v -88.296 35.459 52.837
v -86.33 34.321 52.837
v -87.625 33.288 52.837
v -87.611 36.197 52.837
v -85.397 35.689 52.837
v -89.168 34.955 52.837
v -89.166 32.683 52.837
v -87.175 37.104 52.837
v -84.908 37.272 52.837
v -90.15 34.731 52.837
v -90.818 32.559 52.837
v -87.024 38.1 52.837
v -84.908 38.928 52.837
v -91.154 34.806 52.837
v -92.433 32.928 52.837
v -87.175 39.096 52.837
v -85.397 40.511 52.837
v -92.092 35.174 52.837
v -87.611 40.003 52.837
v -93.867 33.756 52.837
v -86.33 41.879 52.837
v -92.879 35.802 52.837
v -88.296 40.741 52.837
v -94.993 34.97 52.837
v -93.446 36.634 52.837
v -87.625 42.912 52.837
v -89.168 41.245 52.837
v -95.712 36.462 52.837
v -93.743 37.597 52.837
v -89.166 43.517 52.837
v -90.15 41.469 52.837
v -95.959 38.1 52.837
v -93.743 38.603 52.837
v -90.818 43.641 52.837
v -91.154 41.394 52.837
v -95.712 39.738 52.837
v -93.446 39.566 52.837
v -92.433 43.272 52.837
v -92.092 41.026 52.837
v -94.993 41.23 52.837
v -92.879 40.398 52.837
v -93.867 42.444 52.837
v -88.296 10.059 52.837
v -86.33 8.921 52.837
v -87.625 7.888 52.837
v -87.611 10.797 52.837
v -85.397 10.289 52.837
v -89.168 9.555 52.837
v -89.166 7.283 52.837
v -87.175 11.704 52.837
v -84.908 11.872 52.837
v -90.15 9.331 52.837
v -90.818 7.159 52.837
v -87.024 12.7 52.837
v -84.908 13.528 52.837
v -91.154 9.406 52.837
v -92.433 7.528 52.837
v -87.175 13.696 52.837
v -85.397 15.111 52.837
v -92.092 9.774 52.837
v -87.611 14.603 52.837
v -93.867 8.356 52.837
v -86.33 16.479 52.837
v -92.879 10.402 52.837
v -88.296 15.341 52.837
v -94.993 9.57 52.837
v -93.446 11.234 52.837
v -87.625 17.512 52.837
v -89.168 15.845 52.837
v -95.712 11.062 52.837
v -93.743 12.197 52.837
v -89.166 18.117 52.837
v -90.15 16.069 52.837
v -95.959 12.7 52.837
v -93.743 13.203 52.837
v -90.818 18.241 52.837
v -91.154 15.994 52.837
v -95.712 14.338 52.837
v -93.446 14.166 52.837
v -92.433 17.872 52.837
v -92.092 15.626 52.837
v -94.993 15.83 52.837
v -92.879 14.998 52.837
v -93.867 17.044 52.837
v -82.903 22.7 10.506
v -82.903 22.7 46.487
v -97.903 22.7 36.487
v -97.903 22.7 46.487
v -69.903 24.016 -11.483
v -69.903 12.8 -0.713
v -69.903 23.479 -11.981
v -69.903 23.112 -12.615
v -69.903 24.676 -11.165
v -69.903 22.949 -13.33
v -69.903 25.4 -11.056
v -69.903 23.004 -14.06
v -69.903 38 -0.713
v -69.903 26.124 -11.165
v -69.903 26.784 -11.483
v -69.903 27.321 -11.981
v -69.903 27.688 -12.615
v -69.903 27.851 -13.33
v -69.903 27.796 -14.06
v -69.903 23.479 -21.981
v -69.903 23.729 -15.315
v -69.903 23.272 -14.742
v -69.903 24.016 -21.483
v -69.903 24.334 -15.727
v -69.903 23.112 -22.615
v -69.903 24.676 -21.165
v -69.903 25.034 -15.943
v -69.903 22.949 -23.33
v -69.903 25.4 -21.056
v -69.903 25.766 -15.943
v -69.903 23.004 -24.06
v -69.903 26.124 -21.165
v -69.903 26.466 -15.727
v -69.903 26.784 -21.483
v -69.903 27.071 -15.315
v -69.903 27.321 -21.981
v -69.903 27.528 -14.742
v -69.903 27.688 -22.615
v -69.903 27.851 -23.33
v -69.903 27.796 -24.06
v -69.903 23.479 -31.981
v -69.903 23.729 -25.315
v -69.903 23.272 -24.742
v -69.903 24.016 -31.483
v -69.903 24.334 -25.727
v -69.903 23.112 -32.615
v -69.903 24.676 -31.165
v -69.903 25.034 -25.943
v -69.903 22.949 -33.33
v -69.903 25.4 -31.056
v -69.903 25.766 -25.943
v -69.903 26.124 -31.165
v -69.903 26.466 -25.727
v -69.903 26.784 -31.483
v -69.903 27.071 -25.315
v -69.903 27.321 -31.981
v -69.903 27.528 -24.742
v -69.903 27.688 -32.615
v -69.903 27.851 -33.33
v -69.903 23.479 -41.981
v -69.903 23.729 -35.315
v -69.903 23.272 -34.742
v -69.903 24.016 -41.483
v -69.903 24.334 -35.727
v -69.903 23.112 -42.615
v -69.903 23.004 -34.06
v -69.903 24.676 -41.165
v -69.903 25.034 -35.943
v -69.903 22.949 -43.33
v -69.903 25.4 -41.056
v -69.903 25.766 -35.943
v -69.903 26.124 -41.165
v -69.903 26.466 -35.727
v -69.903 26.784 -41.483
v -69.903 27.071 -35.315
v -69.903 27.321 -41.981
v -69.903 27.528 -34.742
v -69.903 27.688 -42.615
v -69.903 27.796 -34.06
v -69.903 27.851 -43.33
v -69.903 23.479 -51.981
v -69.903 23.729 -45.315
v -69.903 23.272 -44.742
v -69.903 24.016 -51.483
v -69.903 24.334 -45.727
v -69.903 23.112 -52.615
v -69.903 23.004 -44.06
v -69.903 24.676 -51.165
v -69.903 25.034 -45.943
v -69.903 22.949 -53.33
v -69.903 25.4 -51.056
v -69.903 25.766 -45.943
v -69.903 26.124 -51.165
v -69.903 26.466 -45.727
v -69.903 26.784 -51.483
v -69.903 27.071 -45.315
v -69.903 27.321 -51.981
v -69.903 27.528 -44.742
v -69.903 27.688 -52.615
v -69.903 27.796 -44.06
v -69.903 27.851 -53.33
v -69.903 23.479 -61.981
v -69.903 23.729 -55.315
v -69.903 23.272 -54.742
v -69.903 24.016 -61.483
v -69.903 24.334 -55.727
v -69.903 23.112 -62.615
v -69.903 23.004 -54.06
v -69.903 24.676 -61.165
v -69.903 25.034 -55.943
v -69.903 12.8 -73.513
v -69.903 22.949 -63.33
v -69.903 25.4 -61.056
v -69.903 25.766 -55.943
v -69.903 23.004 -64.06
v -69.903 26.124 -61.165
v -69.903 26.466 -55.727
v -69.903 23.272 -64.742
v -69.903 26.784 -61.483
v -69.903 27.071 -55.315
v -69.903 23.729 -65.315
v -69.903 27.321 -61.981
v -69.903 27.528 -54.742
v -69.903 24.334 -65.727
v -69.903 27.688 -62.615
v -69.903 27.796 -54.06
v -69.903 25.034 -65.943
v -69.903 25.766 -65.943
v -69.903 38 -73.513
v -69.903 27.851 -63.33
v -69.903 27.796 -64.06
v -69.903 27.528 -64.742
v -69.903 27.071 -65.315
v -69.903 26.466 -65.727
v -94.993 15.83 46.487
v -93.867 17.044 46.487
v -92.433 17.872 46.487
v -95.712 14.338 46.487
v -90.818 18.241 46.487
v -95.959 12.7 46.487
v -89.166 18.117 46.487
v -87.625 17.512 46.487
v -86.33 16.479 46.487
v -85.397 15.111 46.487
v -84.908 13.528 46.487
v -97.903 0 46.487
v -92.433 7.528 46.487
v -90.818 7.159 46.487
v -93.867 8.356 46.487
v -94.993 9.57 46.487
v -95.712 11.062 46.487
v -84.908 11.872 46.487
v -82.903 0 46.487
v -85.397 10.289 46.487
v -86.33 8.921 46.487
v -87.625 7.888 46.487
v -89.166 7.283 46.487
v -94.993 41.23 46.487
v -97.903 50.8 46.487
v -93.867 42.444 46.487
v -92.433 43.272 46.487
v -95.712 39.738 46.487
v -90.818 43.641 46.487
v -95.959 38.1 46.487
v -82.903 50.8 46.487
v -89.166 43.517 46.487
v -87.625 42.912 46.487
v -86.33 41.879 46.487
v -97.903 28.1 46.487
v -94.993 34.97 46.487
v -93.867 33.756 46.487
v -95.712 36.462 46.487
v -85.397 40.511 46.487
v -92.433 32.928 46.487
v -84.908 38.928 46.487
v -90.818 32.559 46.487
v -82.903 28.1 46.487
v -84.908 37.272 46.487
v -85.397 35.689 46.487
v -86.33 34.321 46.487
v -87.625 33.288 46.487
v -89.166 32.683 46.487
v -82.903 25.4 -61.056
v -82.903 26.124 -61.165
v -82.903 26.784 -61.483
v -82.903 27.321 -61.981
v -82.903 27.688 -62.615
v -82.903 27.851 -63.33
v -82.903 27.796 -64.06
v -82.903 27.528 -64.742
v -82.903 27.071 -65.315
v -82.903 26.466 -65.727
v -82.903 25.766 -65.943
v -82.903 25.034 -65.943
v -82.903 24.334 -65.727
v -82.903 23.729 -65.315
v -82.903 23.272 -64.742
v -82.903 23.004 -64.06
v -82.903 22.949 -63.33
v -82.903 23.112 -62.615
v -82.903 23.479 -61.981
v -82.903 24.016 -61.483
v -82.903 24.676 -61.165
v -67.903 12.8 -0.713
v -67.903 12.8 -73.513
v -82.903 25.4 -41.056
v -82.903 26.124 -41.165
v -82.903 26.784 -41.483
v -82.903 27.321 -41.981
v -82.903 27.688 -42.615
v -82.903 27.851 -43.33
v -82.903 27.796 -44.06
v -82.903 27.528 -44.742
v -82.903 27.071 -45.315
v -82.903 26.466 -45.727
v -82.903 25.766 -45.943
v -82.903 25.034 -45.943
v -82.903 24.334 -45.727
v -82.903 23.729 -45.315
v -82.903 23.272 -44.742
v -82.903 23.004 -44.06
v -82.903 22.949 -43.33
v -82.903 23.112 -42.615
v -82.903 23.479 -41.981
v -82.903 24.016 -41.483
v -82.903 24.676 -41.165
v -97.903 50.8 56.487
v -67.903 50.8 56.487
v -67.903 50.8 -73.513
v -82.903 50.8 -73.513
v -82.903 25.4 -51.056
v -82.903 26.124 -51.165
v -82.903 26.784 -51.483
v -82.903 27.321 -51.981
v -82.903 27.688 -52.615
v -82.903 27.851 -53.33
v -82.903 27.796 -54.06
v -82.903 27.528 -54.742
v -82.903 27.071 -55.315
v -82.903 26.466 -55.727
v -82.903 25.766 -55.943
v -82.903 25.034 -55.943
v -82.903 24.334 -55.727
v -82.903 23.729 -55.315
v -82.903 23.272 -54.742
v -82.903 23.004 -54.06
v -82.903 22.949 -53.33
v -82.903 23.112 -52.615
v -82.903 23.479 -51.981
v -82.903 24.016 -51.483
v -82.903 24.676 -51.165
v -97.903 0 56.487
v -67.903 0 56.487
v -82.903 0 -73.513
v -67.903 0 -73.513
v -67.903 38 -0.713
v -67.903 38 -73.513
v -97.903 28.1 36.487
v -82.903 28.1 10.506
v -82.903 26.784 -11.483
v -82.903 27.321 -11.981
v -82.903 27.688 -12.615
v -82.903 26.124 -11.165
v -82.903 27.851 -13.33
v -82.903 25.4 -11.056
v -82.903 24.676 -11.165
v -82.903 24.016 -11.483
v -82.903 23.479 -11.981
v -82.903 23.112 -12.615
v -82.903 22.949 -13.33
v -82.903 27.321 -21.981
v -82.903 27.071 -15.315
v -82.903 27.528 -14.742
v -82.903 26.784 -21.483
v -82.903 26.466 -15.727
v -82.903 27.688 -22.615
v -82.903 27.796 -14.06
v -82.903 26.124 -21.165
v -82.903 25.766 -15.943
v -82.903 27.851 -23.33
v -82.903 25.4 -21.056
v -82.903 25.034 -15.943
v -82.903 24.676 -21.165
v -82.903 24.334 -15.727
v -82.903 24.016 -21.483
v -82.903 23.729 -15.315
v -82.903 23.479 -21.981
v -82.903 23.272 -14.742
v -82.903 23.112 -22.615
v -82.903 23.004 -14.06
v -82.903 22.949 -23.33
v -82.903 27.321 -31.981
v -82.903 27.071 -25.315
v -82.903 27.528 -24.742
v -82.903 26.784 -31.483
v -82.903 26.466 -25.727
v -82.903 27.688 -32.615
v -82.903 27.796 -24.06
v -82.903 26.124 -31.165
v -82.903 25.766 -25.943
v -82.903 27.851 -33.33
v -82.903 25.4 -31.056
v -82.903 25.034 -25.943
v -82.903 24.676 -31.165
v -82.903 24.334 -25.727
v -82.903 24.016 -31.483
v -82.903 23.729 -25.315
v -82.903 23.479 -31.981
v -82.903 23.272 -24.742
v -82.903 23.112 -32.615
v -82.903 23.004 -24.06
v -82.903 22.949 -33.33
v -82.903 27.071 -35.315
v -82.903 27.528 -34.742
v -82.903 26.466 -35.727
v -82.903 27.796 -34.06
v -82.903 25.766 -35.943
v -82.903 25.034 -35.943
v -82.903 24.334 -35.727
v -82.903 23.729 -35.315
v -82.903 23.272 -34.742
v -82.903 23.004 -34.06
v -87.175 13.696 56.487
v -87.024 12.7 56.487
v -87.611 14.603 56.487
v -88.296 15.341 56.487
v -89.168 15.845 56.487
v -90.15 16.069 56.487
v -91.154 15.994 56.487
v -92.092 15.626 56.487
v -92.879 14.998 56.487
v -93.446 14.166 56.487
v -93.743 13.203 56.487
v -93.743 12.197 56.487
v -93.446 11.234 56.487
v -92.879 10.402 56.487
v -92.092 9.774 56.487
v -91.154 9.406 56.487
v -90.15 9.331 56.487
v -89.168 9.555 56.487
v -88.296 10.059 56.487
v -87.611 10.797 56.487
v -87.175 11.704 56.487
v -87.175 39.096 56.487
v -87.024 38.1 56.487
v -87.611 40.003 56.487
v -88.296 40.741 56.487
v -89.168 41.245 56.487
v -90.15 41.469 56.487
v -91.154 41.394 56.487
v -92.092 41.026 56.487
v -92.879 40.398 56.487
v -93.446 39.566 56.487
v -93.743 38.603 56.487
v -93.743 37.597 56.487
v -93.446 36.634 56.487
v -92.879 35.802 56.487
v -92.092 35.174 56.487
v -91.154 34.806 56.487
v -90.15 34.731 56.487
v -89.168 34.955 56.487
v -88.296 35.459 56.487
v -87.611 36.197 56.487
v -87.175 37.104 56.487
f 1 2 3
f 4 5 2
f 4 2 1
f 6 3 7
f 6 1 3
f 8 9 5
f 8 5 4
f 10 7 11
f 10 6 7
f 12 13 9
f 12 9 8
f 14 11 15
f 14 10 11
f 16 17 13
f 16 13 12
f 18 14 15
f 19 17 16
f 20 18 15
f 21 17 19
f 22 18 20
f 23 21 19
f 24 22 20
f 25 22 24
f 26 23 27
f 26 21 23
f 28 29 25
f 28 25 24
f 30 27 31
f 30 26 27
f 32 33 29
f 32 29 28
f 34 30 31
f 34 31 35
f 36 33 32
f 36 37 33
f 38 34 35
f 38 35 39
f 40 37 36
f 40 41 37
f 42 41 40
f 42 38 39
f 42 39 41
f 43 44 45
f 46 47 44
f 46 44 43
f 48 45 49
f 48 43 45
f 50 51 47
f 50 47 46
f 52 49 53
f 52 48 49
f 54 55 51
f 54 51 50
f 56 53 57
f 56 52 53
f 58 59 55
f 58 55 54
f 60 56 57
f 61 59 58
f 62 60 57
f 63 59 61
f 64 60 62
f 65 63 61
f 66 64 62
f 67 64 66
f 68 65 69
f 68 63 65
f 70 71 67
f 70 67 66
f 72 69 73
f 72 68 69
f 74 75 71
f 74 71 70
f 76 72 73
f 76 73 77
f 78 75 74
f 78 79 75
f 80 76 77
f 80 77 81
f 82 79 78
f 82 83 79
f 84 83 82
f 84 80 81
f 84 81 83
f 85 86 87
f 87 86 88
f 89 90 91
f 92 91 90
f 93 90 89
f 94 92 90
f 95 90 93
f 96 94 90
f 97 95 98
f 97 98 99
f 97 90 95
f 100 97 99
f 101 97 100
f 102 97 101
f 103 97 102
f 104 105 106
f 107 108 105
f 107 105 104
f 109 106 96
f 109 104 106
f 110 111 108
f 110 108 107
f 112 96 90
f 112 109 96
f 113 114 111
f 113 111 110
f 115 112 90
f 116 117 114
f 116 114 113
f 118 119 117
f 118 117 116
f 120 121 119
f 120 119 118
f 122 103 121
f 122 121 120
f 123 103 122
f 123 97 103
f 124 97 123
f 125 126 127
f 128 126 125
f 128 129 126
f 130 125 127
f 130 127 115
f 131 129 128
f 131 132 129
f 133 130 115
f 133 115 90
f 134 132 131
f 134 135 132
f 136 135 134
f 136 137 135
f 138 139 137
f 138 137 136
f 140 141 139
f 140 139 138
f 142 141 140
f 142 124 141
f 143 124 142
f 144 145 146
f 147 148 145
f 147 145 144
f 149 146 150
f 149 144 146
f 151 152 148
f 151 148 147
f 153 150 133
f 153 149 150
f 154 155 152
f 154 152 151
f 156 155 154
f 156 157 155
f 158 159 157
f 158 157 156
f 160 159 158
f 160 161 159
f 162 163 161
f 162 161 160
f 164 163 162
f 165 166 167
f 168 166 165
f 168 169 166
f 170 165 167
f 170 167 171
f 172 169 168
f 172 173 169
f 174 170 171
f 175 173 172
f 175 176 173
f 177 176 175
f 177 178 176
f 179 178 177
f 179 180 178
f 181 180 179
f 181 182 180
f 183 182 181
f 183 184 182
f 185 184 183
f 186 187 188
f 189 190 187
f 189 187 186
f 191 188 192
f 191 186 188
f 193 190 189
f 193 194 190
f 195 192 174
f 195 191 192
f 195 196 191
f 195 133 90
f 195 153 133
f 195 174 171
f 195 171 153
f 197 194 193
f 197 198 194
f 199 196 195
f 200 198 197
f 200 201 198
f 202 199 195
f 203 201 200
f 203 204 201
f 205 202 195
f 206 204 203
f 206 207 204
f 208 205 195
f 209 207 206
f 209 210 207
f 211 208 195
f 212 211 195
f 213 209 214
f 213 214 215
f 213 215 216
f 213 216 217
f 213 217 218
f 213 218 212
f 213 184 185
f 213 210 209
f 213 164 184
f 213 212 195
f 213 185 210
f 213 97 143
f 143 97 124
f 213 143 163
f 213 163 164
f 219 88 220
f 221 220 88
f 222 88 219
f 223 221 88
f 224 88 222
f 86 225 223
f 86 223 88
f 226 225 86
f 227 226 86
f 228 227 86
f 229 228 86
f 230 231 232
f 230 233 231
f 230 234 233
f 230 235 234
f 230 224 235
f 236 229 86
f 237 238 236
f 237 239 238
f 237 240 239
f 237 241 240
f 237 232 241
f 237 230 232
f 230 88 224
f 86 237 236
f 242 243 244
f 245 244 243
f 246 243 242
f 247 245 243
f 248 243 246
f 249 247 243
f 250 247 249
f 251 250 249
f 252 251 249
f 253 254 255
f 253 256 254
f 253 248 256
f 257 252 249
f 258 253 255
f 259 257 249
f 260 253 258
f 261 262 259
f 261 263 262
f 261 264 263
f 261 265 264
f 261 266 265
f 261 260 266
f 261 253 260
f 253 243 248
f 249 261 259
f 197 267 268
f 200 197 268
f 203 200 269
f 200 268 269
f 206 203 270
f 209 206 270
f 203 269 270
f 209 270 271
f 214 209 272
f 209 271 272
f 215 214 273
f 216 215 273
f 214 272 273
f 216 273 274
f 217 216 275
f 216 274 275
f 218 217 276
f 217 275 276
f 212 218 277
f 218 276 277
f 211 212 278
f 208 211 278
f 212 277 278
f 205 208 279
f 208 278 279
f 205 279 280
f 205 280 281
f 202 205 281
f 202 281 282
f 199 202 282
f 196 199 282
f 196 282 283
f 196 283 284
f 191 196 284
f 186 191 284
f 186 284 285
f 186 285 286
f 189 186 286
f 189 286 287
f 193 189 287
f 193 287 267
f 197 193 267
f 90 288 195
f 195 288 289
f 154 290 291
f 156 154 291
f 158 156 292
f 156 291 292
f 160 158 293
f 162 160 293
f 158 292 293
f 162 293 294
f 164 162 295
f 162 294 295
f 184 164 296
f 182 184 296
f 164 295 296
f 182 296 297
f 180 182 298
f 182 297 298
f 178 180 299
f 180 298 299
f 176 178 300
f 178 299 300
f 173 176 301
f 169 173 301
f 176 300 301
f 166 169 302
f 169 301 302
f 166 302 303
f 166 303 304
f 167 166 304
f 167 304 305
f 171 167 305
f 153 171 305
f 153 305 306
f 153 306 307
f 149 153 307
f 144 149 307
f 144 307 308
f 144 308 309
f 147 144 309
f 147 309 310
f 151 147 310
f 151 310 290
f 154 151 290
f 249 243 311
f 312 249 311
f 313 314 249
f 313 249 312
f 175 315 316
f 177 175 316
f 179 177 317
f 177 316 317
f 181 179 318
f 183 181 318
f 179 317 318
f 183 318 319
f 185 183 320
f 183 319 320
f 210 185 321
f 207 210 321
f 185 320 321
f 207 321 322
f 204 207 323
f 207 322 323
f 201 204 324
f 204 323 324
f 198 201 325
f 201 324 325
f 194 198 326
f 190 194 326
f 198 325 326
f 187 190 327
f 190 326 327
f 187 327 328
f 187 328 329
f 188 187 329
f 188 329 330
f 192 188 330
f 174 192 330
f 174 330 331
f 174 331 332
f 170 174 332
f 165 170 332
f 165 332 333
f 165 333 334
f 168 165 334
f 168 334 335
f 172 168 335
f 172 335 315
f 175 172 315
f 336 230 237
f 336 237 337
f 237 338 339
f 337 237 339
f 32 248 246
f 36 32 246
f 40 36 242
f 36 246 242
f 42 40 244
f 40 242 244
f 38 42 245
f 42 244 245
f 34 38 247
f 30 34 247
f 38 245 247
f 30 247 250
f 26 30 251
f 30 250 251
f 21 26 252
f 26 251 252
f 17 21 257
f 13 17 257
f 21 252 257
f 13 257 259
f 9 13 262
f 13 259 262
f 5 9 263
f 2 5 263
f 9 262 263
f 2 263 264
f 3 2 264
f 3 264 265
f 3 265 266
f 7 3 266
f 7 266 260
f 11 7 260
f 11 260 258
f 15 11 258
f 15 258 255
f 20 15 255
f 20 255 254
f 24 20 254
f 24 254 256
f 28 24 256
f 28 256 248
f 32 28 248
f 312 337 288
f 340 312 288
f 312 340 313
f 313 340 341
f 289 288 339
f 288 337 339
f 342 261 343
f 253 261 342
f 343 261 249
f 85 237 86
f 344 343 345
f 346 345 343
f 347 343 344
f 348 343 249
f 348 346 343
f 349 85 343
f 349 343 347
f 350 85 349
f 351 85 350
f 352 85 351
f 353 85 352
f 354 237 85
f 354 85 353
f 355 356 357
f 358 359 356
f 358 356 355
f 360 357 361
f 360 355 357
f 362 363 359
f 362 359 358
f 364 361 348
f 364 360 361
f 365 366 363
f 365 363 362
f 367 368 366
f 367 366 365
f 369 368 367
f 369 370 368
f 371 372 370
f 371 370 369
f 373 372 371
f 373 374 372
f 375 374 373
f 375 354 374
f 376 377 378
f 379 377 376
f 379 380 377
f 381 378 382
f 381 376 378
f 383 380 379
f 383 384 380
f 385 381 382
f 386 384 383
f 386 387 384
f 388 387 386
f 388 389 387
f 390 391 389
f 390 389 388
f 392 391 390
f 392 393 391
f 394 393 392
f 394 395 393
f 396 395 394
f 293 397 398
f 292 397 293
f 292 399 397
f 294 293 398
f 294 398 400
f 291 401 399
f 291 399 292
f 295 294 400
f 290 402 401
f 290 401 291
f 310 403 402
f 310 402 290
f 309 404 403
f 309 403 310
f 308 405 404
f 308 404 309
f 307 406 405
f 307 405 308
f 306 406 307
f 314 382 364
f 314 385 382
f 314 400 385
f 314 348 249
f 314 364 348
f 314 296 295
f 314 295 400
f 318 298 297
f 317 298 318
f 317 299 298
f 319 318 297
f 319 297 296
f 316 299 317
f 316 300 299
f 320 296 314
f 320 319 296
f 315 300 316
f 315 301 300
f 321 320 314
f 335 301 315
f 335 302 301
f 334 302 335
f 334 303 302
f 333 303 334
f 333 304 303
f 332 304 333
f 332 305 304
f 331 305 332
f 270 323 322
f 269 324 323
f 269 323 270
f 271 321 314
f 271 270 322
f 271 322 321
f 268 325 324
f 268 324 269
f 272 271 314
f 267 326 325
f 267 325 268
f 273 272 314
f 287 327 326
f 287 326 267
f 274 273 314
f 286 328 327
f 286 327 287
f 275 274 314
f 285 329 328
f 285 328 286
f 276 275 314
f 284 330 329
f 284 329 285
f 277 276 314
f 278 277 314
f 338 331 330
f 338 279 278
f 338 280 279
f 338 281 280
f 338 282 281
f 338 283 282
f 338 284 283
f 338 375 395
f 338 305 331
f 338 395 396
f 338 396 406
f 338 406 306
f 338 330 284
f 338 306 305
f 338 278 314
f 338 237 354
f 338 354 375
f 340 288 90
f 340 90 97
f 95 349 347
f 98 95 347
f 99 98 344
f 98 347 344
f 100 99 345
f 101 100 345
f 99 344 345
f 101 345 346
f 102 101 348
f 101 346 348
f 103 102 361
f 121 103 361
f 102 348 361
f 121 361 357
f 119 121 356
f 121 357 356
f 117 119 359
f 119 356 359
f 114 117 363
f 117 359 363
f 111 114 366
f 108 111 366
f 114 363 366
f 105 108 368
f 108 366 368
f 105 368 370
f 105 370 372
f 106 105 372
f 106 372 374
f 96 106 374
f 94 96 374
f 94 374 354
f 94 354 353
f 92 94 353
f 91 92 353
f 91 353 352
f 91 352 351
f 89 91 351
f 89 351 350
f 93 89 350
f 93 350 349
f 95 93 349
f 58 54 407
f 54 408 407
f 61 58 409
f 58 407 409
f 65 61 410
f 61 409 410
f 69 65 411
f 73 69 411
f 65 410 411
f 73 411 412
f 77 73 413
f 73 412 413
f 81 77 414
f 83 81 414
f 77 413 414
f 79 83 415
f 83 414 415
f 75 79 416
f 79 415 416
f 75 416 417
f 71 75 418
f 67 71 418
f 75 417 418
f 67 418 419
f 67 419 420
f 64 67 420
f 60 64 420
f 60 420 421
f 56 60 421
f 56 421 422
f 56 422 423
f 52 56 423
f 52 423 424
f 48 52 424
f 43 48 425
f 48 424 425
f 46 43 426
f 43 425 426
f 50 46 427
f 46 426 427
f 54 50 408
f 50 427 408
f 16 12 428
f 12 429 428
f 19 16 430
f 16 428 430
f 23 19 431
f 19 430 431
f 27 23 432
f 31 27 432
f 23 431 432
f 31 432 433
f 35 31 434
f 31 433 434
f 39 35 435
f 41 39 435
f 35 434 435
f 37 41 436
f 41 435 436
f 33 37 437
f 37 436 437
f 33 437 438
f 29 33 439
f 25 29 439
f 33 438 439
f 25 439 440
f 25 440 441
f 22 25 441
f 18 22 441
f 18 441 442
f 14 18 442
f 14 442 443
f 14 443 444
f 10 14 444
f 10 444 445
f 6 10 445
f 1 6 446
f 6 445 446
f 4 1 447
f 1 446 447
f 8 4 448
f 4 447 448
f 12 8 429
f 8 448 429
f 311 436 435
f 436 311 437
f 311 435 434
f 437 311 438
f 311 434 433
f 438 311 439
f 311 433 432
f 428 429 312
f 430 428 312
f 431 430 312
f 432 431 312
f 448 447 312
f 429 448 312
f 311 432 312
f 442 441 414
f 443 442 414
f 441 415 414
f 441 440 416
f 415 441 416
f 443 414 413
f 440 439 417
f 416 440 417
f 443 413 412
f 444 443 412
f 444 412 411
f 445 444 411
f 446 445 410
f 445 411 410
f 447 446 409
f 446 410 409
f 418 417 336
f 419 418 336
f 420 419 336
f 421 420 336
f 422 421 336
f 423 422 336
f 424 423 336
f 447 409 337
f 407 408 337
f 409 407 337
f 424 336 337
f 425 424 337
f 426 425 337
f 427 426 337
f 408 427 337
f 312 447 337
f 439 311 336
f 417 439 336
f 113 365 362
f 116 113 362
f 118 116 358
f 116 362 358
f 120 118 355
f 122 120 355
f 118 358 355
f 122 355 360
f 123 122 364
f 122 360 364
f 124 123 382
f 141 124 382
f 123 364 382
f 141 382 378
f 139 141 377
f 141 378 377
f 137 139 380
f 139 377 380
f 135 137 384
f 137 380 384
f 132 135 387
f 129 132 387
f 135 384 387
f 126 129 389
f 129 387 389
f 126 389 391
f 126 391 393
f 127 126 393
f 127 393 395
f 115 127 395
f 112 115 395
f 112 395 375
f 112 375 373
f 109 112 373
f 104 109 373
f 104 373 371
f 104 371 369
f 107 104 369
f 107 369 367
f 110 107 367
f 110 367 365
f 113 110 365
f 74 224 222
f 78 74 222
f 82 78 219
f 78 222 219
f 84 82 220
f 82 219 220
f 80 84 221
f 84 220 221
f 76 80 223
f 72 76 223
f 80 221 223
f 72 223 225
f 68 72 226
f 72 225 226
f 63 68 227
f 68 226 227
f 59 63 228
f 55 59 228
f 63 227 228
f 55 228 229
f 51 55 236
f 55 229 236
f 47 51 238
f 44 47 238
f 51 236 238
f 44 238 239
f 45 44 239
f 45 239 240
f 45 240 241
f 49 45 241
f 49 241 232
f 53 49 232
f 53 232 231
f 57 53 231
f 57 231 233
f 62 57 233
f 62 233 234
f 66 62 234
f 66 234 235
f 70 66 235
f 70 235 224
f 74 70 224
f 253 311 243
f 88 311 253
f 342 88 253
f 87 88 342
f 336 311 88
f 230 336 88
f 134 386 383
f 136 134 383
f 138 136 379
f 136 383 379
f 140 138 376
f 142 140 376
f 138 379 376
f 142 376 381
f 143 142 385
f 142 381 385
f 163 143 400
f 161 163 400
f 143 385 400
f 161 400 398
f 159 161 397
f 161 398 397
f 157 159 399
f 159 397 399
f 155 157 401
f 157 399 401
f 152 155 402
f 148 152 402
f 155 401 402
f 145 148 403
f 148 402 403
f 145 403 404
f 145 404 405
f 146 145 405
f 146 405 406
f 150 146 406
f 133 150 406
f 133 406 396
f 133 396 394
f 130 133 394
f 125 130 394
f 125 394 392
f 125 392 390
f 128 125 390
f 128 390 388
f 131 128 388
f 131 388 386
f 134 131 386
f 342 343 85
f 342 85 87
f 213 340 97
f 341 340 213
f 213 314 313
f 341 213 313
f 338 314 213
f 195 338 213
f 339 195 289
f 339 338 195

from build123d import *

# Parameters (mm, degrees)
SKETCH1_W                                        = 15
SKETCH1_H                                        = 130
SKETCH1_H_2                                      = 10
BOSS_EXTRUDE1_DEPTH                              = 50.8
CBORE_FOR_1_4_SOCKET_HEAD_CAP_SCREW1_D           = 6.7564
CBORE_FOR_1_4_SOCKET_HEAD_CAP_SCREW1_CBORE_D     = 11.1125
CBORE_FOR_1_4_SOCKET_HEAD_CAP_SCREW1_CBORE_DEPTH = 6.35
F_8_CLEARANCE_HOLE2_D                            = 4.9149
LPATTERN1_COUNT                                  = 3
LPATTERN1_PITCH                                  = 20
SKETCH10_W                                       = 72.8
SKETCH10_H                                       = 25.2
CUT_EXTRUDE1_DEPTH                               = 2
SKETCH13_W                                       = 15
SKETCH13_H                                       = 5.4
BOSS_EXTRUDE2_DEPTH                              = 10
DRAFT1_ANGLE                                     = 60


with BuildPart() as part:
    # Sketch1 → Boss-Extrude1 (new body)
    with BuildSketch(Plane(origin=(0, 0, 0), x_dir=(1, 0, 0), z_dir=(0, 1, 0))):
        with Locations((-75.402654867, 8.513274336)):
            Rectangle(SKETCH1_W, SKETCH1_H)
        with Locations((-90.402654867, -51.486725664)):
            Rectangle(SKETCH1_W, SKETCH1_H_2)
    extrude(amount=BOSS_EXTRUDE1_DEPTH)

    # CBORE for 1/4 Socket Head Cap Screw1 (through all)
    with Locations(Plane(origin=(0, 0, 46.486725664), x_dir=(-1, 0, 0), z_dir=(0, 0, -1))):
        with Locations((90.402654867, 12.7), (90.402654867, 38.1)):
            CounterBoreHole(CBORE_FOR_1_4_SOCKET_HEAD_CAP_SCREW1_D / 2, CBORE_FOR_1_4_SOCKET_HEAD_CAP_SCREW1_CBORE_D / 2, CBORE_FOR_1_4_SOCKET_HEAD_CAP_SCREW1_CBORE_DEPTH)

    # #8 Clearance Hole2 (through all)
    with Locations(Plane(origin=(-67.902654867, 0, 0), x_dir=(0, 0, -1), z_dir=(1, 0, 0))):
        with Locations((63.513274336, 25.4), (53.513274336, 25.4)):
            f_8_clearance_hole2 = Hole(F_8_CLEARANCE_HOLE2_D / 2)

    # LPattern1: #8 Clearance Hole2 ×3
    with Locations(*[(0, 0, i * LPATTERN1_PITCH) for i in range(1, LPATTERN1_COUNT)]):
        add(f_8_clearance_hole2, mode=Mode.SUBTRACT)

    # Sketch10 → Cut-Extrude1 (cut)
    with BuildSketch(Plane(origin=(-67.902654867, 0, 0), x_dir=(0, 0, -1), z_dir=(1, 0, 0))):
        with Locations((37.113274336, 25.4)):
            Rectangle(SKETCH10_W, SKETCH10_H)
    extrude(amount=-CUT_EXTRUDE1_DEPTH, mode=Mode.SUBTRACT)

    # Sketch13 → Boss-Extrude2 (add)
    with BuildSketch(Plane(origin=(0, 0, 46.486725664), x_dir=(-1, 0, 0), z_dir=(0, 0, -1))):
        with Locations((90.402654867, 25.4)):
            Rectangle(SKETCH13_W, SKETCH13_H)
    extrude(amount=BOSS_EXTRUDE2_DEPTH)

    # Draft1
    draft1_faces = [part.faces().sort_by_distance(p)[0] for p in [
        (-90.402654867, 25.4, 36.486725664),
    ]]
    draft(draft1_faces, Plane(origin=(-97.902654867, 50.8, 0), x_dir=(0, 0, -1), z_dir=(-1, 0, 0)), DRAFT1_ANGLE)


solid = part.part
